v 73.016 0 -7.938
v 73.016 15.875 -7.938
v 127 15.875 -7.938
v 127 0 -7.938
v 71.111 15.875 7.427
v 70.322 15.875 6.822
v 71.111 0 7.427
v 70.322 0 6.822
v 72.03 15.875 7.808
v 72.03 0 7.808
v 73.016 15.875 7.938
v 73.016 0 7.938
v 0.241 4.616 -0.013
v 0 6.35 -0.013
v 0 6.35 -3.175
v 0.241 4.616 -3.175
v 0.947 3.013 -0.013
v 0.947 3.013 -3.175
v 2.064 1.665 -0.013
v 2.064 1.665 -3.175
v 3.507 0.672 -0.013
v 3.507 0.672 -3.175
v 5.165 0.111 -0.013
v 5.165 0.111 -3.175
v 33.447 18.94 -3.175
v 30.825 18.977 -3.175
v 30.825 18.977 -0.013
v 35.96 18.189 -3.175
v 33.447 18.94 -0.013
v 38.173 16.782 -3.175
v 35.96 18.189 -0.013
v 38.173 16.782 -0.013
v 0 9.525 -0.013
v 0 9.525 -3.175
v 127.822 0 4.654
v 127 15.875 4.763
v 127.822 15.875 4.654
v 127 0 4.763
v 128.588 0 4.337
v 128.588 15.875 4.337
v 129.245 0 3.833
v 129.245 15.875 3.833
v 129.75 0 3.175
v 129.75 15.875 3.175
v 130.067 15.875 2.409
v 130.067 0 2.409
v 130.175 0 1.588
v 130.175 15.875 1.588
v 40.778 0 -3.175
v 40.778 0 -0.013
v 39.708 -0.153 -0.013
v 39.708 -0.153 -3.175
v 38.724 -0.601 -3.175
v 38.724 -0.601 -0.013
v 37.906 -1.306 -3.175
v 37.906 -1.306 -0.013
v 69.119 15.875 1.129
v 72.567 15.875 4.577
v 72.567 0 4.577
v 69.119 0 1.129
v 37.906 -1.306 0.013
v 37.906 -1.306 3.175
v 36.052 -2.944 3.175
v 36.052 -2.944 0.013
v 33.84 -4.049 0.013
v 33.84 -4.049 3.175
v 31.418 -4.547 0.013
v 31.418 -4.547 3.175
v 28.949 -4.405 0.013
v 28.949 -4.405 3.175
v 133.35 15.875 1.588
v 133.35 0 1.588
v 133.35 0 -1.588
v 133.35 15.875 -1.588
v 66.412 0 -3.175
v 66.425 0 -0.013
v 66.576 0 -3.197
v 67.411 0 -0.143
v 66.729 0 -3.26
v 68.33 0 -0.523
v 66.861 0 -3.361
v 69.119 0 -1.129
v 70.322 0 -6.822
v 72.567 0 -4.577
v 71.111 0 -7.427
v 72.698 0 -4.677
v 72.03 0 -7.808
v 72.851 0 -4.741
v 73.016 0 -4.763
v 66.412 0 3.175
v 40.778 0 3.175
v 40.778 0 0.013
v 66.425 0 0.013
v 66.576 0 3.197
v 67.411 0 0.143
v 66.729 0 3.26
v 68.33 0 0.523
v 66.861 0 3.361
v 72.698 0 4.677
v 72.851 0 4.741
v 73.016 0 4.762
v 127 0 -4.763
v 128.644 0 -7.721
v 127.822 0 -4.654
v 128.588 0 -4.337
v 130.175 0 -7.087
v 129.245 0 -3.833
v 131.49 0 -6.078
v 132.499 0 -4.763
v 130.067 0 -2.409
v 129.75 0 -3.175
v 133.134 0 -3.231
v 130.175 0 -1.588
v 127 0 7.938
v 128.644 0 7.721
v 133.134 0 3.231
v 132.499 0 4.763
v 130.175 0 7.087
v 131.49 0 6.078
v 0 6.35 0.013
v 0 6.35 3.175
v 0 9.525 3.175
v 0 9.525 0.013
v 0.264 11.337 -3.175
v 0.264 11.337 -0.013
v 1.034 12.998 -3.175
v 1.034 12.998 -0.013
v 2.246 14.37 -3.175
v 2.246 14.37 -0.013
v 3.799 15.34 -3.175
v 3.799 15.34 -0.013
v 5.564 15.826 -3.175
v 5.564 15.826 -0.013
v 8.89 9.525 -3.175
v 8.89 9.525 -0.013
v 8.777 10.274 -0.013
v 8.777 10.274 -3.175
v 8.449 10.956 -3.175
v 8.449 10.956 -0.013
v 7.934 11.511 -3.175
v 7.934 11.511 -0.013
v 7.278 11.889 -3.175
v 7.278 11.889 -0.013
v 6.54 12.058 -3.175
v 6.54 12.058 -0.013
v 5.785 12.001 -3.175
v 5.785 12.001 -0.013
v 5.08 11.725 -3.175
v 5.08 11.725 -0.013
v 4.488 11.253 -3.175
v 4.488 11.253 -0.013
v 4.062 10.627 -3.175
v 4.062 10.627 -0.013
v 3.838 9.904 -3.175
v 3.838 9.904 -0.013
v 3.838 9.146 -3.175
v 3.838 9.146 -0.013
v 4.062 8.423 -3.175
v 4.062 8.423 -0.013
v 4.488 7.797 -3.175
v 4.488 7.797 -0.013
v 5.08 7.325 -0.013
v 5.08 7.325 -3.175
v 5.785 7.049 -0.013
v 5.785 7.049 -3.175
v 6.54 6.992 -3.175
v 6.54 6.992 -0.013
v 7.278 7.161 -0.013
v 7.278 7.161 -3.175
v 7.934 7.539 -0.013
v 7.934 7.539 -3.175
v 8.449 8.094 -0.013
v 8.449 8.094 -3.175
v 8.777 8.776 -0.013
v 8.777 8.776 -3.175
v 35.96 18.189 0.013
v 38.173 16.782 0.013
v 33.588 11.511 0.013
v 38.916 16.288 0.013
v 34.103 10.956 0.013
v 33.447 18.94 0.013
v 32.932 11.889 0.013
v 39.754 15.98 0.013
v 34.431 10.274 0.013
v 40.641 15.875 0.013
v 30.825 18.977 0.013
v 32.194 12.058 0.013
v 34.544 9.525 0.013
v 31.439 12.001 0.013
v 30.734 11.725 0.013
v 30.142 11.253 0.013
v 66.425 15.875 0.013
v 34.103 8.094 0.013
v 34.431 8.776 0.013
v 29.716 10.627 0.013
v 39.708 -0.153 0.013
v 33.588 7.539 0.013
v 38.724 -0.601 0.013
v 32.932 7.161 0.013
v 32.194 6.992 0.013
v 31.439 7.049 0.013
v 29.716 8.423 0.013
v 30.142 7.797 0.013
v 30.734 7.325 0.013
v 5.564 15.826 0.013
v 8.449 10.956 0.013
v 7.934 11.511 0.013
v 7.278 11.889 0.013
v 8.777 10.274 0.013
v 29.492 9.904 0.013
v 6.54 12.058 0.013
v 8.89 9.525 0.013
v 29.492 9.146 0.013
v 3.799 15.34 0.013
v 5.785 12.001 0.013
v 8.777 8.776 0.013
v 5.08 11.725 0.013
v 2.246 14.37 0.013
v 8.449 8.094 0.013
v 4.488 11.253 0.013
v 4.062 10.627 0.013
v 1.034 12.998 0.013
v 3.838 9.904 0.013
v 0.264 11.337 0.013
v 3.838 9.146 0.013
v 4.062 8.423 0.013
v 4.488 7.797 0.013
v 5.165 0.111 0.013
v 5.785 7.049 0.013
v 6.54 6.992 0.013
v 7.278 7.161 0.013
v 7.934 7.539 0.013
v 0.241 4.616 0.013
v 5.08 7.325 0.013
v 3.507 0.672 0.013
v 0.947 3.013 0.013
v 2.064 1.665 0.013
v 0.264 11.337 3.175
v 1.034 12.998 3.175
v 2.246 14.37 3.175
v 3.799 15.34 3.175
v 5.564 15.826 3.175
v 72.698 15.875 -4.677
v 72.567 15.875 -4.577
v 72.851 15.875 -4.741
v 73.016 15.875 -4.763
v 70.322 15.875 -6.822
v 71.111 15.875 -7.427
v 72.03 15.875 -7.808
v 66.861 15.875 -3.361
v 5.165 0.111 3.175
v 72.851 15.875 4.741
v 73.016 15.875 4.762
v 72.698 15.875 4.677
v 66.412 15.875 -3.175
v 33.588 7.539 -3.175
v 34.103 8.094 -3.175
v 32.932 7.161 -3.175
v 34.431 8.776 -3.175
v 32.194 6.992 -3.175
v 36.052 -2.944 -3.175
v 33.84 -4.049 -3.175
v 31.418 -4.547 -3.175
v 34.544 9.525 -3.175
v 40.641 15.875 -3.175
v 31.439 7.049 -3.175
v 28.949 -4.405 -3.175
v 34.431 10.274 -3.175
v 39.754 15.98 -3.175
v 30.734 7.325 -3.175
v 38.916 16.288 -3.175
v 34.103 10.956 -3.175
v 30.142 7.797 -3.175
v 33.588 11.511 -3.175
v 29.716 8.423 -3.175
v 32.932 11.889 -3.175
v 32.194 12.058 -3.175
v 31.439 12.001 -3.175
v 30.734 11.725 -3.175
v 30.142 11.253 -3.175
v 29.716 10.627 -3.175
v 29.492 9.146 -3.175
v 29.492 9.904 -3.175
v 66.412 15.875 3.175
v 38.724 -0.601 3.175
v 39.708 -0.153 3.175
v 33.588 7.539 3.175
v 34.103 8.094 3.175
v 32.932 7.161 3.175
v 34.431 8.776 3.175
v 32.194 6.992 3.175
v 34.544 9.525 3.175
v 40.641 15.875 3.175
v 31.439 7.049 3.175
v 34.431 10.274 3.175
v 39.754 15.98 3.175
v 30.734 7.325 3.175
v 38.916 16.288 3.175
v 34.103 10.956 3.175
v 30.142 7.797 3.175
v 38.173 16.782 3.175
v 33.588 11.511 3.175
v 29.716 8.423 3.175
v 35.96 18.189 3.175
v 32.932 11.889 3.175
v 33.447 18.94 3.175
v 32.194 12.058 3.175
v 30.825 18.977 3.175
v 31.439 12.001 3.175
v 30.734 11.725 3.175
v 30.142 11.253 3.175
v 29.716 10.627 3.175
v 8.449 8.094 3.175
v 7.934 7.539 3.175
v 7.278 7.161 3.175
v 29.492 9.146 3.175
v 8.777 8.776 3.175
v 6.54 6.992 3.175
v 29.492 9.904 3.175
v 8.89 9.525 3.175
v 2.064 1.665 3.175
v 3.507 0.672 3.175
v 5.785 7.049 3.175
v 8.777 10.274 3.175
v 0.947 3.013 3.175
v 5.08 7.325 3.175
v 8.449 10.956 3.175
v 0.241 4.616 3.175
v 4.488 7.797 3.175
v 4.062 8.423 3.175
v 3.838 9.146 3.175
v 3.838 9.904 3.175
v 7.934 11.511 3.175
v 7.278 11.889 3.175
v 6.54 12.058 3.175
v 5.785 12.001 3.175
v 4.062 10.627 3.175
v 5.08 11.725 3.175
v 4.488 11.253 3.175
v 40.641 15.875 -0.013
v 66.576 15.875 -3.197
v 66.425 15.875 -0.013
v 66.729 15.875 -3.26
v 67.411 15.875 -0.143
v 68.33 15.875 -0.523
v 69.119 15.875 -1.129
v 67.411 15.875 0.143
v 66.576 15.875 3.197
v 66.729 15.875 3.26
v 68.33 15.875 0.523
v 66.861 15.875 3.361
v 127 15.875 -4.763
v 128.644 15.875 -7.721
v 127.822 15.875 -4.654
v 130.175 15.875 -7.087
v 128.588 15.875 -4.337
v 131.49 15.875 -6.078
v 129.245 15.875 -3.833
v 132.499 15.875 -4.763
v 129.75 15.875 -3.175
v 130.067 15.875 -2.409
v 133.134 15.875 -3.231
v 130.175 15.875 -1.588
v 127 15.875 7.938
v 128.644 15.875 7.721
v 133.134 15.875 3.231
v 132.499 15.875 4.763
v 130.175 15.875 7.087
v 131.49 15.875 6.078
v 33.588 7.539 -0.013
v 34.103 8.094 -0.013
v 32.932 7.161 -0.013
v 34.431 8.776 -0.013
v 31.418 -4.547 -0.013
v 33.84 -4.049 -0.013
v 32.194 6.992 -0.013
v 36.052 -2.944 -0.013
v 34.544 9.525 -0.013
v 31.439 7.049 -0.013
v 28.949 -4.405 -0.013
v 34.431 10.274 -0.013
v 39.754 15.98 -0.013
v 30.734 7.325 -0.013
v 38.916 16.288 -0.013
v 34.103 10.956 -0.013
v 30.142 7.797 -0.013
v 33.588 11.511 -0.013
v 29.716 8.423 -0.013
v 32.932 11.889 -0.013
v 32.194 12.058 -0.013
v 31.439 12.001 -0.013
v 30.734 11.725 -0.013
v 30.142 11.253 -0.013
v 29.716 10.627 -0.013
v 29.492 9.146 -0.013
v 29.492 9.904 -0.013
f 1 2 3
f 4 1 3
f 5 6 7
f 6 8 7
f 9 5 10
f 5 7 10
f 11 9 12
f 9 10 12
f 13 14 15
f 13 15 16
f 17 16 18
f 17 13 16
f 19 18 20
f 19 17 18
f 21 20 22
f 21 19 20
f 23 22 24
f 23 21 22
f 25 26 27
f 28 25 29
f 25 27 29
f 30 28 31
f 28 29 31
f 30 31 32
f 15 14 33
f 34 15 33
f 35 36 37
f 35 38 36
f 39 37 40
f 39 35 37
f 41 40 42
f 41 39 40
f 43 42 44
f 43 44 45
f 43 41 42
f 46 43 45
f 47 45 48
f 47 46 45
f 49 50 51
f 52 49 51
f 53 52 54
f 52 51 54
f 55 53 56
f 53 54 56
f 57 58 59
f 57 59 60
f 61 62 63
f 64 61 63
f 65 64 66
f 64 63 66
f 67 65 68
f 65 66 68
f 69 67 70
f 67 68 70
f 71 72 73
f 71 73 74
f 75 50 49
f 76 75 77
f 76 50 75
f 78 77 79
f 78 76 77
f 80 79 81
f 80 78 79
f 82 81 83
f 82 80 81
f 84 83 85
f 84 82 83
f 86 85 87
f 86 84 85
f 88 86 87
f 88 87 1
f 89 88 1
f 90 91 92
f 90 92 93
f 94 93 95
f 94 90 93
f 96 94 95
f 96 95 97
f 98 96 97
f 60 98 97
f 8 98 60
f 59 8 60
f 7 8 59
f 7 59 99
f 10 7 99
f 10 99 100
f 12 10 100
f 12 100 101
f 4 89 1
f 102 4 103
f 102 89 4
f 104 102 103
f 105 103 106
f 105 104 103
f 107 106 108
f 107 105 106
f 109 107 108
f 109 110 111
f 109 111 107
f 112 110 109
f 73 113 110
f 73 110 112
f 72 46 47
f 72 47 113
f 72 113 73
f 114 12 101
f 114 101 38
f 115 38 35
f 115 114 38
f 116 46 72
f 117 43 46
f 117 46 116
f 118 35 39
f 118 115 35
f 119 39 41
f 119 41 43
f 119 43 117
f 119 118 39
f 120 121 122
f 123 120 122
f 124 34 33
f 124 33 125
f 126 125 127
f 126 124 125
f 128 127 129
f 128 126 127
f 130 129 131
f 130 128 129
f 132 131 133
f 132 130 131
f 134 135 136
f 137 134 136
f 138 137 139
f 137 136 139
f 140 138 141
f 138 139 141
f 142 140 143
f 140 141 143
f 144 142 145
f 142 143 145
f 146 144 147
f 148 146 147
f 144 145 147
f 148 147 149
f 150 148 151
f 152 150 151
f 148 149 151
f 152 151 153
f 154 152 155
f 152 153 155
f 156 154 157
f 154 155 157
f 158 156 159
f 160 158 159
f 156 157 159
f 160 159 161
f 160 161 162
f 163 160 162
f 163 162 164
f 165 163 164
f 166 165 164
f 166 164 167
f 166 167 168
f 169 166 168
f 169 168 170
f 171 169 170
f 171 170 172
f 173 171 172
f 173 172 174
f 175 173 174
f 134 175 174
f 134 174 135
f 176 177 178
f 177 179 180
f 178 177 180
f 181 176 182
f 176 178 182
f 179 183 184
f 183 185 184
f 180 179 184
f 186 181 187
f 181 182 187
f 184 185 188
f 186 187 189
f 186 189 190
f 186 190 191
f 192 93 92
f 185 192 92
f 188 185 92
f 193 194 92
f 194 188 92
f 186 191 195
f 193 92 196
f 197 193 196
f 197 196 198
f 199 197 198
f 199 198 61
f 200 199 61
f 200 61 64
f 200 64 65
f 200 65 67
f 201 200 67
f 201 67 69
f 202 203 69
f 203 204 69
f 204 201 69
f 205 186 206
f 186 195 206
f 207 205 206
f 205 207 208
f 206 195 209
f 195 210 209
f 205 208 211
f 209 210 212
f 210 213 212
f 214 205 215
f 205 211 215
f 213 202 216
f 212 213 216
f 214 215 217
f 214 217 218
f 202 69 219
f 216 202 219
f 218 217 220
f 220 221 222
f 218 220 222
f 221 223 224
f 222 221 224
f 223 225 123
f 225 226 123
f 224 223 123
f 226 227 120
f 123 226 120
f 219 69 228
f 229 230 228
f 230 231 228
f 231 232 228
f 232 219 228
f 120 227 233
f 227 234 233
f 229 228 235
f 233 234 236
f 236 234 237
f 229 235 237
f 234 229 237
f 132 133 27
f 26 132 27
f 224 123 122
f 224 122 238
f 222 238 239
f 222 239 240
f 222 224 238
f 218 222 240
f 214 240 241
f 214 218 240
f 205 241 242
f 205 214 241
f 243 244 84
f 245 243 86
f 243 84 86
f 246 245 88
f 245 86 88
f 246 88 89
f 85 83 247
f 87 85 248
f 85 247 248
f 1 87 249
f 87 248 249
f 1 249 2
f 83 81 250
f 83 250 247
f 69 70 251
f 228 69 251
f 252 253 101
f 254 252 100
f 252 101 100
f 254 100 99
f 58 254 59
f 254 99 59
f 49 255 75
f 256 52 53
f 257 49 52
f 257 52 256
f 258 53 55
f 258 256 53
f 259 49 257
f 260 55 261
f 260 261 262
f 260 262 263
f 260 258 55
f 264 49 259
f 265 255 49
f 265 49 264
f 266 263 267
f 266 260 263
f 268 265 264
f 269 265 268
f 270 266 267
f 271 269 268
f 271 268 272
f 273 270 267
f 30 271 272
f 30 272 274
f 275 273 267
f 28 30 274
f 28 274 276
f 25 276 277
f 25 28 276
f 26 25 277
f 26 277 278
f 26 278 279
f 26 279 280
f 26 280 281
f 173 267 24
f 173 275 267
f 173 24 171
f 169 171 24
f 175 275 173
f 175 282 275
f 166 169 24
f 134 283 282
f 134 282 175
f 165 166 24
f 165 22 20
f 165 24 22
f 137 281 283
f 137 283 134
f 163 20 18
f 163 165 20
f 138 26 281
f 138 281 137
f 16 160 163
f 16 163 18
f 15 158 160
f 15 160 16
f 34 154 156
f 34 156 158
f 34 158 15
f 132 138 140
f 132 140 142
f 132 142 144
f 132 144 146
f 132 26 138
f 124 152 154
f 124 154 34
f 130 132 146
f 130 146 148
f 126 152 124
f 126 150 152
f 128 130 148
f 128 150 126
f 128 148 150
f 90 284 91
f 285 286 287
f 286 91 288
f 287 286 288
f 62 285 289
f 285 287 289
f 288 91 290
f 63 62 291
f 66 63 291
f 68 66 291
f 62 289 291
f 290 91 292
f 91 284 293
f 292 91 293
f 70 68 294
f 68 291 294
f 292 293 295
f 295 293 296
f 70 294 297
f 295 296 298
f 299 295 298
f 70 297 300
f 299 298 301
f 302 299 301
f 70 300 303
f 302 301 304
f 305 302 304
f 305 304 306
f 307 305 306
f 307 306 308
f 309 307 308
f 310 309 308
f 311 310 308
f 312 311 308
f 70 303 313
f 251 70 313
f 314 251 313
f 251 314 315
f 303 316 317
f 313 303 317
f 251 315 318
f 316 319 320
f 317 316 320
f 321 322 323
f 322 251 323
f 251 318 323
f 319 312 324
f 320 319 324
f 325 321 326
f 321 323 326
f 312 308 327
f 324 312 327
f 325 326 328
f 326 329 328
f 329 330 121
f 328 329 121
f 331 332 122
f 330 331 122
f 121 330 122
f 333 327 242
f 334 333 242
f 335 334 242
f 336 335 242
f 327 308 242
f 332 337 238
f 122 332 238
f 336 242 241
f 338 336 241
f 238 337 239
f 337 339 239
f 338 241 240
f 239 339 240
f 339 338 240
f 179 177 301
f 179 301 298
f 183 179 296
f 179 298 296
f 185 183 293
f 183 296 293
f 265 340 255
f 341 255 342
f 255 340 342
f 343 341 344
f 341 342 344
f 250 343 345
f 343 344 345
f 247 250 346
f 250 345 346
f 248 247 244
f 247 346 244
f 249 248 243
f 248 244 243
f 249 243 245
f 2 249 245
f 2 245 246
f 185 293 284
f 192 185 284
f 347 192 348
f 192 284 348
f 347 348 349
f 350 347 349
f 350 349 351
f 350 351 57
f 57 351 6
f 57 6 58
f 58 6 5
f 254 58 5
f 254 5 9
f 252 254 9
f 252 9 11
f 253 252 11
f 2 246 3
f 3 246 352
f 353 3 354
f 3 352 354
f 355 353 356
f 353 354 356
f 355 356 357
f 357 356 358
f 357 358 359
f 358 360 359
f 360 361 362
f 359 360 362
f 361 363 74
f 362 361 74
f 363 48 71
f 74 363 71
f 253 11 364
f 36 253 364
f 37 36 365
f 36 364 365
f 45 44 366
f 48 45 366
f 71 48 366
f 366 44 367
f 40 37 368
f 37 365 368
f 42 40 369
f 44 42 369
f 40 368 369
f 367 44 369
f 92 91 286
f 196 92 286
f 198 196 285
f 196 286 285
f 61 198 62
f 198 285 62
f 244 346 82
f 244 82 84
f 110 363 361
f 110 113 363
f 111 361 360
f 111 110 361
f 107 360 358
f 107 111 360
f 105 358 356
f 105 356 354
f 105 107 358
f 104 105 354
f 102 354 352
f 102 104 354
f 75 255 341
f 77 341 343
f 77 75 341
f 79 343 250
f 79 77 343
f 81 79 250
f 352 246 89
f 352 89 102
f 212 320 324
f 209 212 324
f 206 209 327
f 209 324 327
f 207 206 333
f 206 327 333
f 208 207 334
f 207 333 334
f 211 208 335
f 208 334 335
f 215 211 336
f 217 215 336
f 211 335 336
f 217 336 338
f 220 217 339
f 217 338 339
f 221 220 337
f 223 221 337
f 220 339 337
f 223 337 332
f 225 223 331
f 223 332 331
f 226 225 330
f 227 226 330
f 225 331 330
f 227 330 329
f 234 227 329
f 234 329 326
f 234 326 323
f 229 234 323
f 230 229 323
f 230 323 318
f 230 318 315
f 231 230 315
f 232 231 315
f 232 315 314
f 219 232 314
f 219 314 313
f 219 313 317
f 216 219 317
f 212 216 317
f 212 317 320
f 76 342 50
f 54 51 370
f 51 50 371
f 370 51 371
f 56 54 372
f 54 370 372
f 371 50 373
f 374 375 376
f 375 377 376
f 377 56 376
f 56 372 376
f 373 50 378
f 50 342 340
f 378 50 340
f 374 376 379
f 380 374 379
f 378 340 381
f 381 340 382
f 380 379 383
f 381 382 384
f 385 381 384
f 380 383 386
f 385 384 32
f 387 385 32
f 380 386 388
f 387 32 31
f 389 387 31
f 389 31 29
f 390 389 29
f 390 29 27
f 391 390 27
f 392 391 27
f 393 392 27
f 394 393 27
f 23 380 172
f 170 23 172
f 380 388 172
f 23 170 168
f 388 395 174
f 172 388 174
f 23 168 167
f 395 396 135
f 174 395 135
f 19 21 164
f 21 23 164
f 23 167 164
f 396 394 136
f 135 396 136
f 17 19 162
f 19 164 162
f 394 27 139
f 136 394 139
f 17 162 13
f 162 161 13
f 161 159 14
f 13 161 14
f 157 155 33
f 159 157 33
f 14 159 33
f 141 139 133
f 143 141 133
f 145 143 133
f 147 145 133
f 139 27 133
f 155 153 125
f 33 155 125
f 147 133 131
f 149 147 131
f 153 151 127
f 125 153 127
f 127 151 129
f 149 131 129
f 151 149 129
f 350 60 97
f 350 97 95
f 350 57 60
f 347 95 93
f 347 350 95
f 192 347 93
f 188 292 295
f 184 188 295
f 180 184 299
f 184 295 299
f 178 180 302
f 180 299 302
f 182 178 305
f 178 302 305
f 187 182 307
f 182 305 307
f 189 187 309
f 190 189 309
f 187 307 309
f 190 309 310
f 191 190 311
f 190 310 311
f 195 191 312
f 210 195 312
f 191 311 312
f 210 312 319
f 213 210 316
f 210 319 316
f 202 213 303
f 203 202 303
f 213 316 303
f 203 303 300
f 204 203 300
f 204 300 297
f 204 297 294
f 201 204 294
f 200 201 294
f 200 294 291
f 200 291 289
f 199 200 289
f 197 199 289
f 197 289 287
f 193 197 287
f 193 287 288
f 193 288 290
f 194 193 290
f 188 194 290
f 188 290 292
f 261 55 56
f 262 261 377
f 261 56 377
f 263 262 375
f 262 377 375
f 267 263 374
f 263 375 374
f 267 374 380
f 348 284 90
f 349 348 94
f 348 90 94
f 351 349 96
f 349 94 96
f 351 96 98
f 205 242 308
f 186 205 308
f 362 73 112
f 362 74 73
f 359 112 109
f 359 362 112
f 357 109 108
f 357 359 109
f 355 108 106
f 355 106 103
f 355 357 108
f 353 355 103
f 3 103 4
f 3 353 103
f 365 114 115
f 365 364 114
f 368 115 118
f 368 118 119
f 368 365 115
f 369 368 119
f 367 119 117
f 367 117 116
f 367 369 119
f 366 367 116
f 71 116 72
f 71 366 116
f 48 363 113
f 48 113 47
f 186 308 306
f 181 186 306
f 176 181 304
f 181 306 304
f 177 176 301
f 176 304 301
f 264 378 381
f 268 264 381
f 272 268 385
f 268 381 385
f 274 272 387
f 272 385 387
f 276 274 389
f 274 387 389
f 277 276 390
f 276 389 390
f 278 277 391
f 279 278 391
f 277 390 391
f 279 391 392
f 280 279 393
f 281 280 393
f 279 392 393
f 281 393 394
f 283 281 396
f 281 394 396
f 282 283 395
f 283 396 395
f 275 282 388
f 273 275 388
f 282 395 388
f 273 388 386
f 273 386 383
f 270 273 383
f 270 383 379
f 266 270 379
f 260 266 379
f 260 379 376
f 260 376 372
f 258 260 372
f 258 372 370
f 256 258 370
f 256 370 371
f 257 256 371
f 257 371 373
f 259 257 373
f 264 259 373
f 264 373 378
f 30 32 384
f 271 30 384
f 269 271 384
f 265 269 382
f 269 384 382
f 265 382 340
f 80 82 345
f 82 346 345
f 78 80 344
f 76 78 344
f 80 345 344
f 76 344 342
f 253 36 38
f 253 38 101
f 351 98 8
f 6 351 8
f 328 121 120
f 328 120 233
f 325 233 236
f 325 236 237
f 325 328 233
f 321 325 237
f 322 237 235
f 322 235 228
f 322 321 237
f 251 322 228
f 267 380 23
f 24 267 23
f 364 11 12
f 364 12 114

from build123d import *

# Parameters (mm, degrees)
SKETCH1_W               = 133.35
SKETCH1_H               = 15.875
BASE_EXTRUDE_DEPTH      = 7.9375
CUT_EXTRUDE1_DEPTH      = 16.875
FILLET5_R               = 0.635
FILLET6_R               = 3.81
FILLET7_R               = 3.175
FILLET8_R               = 6.35
FILLET9_R               = 6.35
FILLET10_R              = 6.35
BOSS_EXTRUDE3_DEPTH     = 6.35
FILLET11_R              = 3.81
SKETCH7_R               = 2.54
CUT_EXTRUDE5_DEPTH      = 12.1125
SKETCH8_W               = 76.190653673
SKETCH8_H               = 0.0254
CUT_EXTRUDE6_DEPTH      = 4.175
CUT_EXTRUDE6_DEPTH_BACK = 21.447
FILLET12_R              = 3.81
FILLET13_R              = 3.81


with BuildPart() as part:
    # Sketch1 → Base-Extrude (new body, symmetric)
    with BuildSketch(Plane.XY):
        with Locations((66.675, 7.9375)):
            Rectangle(SKETCH1_W, SKETCH1_H)
    extrude(amount=BASE_EXTRUDE_DEPTH, both=True)

    # Sketch3 → Cut-Extrude1 (cut, through all)
    with BuildSketch(Plane(origin=(0, 15.875, 0), x_dir=(-1, 0, 0), z_dir=(0, 1, 0))):
        Polygon((-72.752628061, -4.7625), (-130.175, -4.7625), (-130.175, 4.7625), (-72.752628061, 4.7625), (-67.990128061, 0), align=None)
        Polygon((1.24743597, -3.175), (-66.675, -3.175), (-73.371059662, -9.871059662), (1.24743597, -9.871059662), align=None)
        Polygon((1.24743597, 3.175), (-66.675, 3.175), (-73.371059662, 9.871059662), (1.24743597, 9.871059662), align=None)
    extrude(amount=-CUT_EXTRUDE1_DEPTH, mode=Mode.SUBTRACT)

    # Fillet5
    fillet5_edges = [part.edges().sort_by_distance(p)[0] for p in [
        (72.752628061, 7.9375, -4.7625),
        (72.752628061, 7.9375, 4.7625),
        (66.675, 7.9375, 3.175),
        (66.675, 7.9375, -3.175),
    ]]
    fillet(fillet5_edges, radius=FILLET5_R)

    # Fillet6
    fillet6_edges = [part.edges().sort_by_distance(p)[0] for p in [
        (71.4375, 7.9375, -7.9375),
        (71.4375, 7.9375, 7.9375),
    ]]
    fillet(fillet6_edges, radius=FILLET6_R)

    # Fillet7
    fillet7_edges = [part.edges().sort_by_distance(p)[0] for p in [
        (130.175, 7.9375, -4.7625),
        (130.175, 7.9375, 4.7625),
    ]]
    fillet(fillet7_edges, radius=FILLET7_R)

    # Fillet8
    fillet8_edges = [part.edges().sort_by_distance(p)[0] for p in [
        (133.35, 7.9375, 7.9375),
        (133.35, 7.9375, -7.9375),
    ]]
    fillet(fillet8_edges, radius=FILLET8_R)

    # Fillet9
    fillet9_edges = [part.edges().sort_by_distance(p)[0] for p in [
        (0, 15.875, 0),
    ]]
    fillet(fillet9_edges, radius=FILLET9_R)

    # Fillet10
    fillet10_edges = [part.edges().sort_by_distance(p)[0] for p in [
        (0, 0, 0),
    ]]
    fillet(fillet10_edges, radius=FILLET10_R)

    # Sketch6 → Boss-Extrude3 (add)
    with BuildSketch(Plane.XY.offset(3.175)):
        with BuildLine():
            Line((5.564108911, 15.826180461), (30.825163366, 18.976770691))
            ThreePointArc((30.825163366, 18.976770691), (39.943880119, 14.786551928), (40.249024971, 4.755808431))
            ThreePointArc((40.249024971, 4.755808431), (36.72434383, -2.446073762), (28.949130797, -4.404784191))
            Line((28.949130797, -4.404784191), (5.165376283, 0.111477206))
            ThreePointArc((5.165376283, 0.111477206), (1.458943846, 2.300300048), (0, 6.35))
            Line((0, 6.35), (0, 9.525))
            ThreePointArc((0, 9.525), (1.590120358, 13.728099546), (5.564108911, 15.826180461))
        make_face()
    extrude(amount=-BOSS_EXTRUDE3_DEPTH)

    # Fillet11
    fillet11_edges = [part.edges().sort_by_distance(p)[0] for p in [
        (38.862, 0, 0),
        (39.103515829, 15.875, 0),
    ]]
    fillet(fillet11_edges, radius=FILLET11_R)

    # Sketch7 → Cut-Extrude5 (cut, through all)
    with BuildSketch(Plane.XY.offset(3.175)):
        with Locations((6.35, 9.525)):
            Circle(SKETCH7_R)
        with Locations((32.004, 9.525)):
            Circle(SKETCH7_R)
    extrude(amount=-CUT_EXTRUDE5_DEPTH, mode=Mode.SUBTRACT)

    # Sketch8 → Cut-Extrude6 (cut, two sides)
    with BuildSketch(Plane(origin=(0, 15.875, 0), x_dir=(-1, 0, 0), z_dir=(0, 1, 0))) as cut_extrude6_sk:
        with Locations((-34.920326837, 0)):
            Rectangle(SKETCH8_W, SKETCH8_H)
    extrude(amount=CUT_EXTRUDE6_DEPTH, mode=Mode.SUBTRACT)
    extrude(cut_extrude6_sk.sketch, amount=-CUT_EXTRUDE6_DEPTH_BACK, mode=Mode.SUBTRACT)

    # Fillet12
    fillet12_edges = [part.edges().sort_by_distance(p)[0] for p in [
        (68.002828061, 7.9375, 0.0127),
    ]]
    fillet(fillet12_edges, radius=FILLET12_R)

    # Fillet13
    fillet13_edges = [part.edges().sort_by_distance(p)[0] for p in [
        (68.002828061, 7.9375, -0.0127),
    ]]
    fillet(fillet13_edges, radius=FILLET13_R)


solid = part.part
